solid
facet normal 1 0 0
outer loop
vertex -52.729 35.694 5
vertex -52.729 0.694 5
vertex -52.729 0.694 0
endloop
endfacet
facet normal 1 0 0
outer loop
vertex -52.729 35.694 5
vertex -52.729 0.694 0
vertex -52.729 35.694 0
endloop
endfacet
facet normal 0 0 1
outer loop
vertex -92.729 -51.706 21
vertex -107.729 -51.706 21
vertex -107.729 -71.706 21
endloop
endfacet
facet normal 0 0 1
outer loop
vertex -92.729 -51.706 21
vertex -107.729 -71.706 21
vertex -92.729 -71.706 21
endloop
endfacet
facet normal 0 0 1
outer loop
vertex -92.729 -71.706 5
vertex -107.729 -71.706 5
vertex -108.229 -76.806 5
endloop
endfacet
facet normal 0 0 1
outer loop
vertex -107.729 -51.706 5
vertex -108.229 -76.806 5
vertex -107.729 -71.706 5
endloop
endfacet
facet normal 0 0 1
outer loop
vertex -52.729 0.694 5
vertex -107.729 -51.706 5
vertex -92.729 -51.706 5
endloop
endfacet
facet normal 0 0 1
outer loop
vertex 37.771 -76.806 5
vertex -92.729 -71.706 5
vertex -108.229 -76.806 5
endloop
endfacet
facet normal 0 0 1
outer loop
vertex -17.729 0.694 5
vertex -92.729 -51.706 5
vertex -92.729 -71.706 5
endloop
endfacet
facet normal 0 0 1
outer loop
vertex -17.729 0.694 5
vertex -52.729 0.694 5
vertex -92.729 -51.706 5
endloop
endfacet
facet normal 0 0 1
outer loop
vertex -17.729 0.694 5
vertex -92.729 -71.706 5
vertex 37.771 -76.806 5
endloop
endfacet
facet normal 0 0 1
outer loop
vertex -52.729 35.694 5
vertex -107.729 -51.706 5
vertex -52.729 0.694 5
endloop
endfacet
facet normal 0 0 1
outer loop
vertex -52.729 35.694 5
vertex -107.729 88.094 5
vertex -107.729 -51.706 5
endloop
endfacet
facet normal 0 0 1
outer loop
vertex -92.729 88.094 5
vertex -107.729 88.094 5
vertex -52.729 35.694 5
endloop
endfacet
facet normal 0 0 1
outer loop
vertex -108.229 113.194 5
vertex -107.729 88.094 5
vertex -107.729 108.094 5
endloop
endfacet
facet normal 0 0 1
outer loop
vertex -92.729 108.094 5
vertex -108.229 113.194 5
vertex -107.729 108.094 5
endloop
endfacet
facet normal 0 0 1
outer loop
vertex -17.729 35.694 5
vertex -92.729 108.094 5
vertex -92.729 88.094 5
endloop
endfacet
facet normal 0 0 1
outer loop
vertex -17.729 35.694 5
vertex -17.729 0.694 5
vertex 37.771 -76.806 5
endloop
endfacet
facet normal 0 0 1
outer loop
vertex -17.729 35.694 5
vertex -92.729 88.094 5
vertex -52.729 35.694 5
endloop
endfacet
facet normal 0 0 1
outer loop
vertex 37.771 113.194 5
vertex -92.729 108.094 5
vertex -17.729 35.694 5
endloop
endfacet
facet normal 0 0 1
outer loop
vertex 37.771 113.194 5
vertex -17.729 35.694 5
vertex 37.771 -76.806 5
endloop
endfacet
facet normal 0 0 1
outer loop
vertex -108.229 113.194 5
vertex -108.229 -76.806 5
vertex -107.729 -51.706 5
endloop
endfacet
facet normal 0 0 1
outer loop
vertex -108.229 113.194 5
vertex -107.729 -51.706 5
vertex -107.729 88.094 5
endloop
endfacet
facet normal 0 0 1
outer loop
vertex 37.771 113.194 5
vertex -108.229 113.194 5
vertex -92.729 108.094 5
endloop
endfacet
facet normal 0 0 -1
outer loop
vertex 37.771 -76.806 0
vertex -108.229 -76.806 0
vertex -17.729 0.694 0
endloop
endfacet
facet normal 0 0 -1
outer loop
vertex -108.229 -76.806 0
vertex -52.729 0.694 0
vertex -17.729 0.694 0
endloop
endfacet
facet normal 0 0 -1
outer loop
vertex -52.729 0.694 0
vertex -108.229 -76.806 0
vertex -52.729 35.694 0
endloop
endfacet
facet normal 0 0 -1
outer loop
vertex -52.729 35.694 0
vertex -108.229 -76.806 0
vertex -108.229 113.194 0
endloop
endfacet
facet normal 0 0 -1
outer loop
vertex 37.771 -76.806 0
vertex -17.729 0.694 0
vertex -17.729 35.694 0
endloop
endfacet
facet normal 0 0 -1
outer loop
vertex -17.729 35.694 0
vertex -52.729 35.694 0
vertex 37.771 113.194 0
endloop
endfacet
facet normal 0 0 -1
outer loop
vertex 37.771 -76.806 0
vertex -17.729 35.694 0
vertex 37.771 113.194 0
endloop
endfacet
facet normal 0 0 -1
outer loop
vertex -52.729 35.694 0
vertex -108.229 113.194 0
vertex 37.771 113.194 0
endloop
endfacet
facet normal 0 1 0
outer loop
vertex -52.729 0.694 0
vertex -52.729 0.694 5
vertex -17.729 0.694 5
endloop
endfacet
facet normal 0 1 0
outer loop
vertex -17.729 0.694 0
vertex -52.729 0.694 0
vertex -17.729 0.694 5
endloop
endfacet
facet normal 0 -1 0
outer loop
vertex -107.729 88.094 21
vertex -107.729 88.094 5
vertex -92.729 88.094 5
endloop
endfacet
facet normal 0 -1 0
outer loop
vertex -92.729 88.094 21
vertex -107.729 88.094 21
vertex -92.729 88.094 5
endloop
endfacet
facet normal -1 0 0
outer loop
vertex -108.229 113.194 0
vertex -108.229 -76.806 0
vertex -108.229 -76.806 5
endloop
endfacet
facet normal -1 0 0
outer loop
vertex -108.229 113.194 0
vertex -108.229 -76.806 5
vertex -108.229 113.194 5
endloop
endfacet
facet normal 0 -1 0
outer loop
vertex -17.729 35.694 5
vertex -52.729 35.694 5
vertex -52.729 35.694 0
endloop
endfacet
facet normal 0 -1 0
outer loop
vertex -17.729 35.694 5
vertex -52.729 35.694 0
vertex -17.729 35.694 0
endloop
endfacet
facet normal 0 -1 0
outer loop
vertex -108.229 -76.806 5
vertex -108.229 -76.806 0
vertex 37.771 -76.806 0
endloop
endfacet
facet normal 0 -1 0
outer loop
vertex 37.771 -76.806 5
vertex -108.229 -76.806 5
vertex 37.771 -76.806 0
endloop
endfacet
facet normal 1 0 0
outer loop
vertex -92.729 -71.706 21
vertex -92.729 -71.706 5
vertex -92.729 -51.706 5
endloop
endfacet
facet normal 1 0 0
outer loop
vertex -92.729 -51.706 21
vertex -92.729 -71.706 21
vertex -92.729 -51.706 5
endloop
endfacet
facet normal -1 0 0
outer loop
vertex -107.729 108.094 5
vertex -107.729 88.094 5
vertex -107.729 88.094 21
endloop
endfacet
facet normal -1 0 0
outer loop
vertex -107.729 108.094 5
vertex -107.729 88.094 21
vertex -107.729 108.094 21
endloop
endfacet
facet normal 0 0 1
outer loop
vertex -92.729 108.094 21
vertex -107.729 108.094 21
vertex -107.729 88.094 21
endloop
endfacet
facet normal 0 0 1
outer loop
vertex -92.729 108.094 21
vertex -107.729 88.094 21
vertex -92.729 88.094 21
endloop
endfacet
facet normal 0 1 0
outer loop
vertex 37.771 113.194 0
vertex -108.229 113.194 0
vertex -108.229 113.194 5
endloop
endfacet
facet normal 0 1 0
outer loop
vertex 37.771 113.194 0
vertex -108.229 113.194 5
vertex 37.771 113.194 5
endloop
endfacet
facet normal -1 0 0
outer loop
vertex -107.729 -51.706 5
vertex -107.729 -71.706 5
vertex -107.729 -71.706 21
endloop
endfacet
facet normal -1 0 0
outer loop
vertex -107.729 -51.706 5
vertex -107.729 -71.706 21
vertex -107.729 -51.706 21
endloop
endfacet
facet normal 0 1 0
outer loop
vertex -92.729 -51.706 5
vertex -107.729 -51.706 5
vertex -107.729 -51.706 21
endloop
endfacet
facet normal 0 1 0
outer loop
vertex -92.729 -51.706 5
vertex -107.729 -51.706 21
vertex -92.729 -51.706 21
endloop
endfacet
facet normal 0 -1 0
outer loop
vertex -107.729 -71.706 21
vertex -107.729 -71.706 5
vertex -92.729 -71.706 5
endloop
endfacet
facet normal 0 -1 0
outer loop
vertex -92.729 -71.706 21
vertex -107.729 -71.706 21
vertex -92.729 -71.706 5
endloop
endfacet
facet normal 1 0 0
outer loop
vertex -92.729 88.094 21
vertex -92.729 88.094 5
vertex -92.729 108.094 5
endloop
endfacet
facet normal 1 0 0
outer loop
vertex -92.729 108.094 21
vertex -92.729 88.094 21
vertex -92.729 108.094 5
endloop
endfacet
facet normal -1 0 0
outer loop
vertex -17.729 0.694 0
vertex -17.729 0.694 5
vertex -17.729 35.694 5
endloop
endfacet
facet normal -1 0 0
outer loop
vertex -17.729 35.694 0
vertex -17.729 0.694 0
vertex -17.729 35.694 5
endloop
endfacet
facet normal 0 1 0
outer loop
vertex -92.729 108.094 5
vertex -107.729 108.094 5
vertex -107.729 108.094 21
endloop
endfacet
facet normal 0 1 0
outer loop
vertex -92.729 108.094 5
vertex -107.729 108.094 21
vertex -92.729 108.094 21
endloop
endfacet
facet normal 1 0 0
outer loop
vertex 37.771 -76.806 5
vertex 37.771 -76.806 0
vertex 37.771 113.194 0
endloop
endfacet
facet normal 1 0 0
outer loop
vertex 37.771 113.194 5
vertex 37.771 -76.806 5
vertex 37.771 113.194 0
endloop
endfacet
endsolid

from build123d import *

# Parameters (mm, degrees)
ESQUISSE1_W             = 146
ESQUISSE1_H             = 190
BOSS_EXTRU_1_DEPTH      = 5
ESQUISSE15_W            = 15
ESQUISSE15_H            = 20
BOSS_EXTRU_7_DEPTH      = 16
ESQUISSE16_W            = 15
ESQUISSE16_H            = 20
BOSS_EXTRU_8_DEPTH      = 16
ESQUISSE17_W            = 35
ESQUISSE17_H            = 35
ENL_V_MAT_EXTRU_1_DEPTH = 5


with BuildPart() as part:
    # Esquisse1 → Boss.-Extru.1 (new body)
    with BuildSketch(Plane.XY):
        with Locations((-35.228613981, 18.194490743)):
            Rectangle(ESQUISSE1_W, ESQUISSE1_H)
    extrude(amount=BOSS_EXTRU_1_DEPTH)

    # Esquisse15 → Boss.-Extru.7 (add)
    with BuildSketch(Plane.XY.offset(5)):
        with Locations((-100.228613981, -61.705509257)):
            Rectangle(ESQUISSE15_W, ESQUISSE15_H)
    extrude(amount=BOSS_EXTRU_7_DEPTH)

    # Esquisse16 → Boss.-Extru.8 (add)
    with BuildSketch(Plane.XY.offset(5)):
        with Locations((-100.228613981, 98.094490743)):
            Rectangle(ESQUISSE16_W, ESQUISSE16_H)
    extrude(amount=BOSS_EXTRU_8_DEPTH)

    # Esquisse17 → Enlèv. mat.-Extru.1 (cut)
    with BuildSketch(Plane.XY.offset(5)):
        with Locations((-35.228613981, 18.194490743)):
            Rectangle(ESQUISSE17_W, ESQUISSE17_H)
    extrude(amount=-ENL_V_MAT_EXTRU_1_DEPTH, mode=Mode.SUBTRACT)


solid = part.part
